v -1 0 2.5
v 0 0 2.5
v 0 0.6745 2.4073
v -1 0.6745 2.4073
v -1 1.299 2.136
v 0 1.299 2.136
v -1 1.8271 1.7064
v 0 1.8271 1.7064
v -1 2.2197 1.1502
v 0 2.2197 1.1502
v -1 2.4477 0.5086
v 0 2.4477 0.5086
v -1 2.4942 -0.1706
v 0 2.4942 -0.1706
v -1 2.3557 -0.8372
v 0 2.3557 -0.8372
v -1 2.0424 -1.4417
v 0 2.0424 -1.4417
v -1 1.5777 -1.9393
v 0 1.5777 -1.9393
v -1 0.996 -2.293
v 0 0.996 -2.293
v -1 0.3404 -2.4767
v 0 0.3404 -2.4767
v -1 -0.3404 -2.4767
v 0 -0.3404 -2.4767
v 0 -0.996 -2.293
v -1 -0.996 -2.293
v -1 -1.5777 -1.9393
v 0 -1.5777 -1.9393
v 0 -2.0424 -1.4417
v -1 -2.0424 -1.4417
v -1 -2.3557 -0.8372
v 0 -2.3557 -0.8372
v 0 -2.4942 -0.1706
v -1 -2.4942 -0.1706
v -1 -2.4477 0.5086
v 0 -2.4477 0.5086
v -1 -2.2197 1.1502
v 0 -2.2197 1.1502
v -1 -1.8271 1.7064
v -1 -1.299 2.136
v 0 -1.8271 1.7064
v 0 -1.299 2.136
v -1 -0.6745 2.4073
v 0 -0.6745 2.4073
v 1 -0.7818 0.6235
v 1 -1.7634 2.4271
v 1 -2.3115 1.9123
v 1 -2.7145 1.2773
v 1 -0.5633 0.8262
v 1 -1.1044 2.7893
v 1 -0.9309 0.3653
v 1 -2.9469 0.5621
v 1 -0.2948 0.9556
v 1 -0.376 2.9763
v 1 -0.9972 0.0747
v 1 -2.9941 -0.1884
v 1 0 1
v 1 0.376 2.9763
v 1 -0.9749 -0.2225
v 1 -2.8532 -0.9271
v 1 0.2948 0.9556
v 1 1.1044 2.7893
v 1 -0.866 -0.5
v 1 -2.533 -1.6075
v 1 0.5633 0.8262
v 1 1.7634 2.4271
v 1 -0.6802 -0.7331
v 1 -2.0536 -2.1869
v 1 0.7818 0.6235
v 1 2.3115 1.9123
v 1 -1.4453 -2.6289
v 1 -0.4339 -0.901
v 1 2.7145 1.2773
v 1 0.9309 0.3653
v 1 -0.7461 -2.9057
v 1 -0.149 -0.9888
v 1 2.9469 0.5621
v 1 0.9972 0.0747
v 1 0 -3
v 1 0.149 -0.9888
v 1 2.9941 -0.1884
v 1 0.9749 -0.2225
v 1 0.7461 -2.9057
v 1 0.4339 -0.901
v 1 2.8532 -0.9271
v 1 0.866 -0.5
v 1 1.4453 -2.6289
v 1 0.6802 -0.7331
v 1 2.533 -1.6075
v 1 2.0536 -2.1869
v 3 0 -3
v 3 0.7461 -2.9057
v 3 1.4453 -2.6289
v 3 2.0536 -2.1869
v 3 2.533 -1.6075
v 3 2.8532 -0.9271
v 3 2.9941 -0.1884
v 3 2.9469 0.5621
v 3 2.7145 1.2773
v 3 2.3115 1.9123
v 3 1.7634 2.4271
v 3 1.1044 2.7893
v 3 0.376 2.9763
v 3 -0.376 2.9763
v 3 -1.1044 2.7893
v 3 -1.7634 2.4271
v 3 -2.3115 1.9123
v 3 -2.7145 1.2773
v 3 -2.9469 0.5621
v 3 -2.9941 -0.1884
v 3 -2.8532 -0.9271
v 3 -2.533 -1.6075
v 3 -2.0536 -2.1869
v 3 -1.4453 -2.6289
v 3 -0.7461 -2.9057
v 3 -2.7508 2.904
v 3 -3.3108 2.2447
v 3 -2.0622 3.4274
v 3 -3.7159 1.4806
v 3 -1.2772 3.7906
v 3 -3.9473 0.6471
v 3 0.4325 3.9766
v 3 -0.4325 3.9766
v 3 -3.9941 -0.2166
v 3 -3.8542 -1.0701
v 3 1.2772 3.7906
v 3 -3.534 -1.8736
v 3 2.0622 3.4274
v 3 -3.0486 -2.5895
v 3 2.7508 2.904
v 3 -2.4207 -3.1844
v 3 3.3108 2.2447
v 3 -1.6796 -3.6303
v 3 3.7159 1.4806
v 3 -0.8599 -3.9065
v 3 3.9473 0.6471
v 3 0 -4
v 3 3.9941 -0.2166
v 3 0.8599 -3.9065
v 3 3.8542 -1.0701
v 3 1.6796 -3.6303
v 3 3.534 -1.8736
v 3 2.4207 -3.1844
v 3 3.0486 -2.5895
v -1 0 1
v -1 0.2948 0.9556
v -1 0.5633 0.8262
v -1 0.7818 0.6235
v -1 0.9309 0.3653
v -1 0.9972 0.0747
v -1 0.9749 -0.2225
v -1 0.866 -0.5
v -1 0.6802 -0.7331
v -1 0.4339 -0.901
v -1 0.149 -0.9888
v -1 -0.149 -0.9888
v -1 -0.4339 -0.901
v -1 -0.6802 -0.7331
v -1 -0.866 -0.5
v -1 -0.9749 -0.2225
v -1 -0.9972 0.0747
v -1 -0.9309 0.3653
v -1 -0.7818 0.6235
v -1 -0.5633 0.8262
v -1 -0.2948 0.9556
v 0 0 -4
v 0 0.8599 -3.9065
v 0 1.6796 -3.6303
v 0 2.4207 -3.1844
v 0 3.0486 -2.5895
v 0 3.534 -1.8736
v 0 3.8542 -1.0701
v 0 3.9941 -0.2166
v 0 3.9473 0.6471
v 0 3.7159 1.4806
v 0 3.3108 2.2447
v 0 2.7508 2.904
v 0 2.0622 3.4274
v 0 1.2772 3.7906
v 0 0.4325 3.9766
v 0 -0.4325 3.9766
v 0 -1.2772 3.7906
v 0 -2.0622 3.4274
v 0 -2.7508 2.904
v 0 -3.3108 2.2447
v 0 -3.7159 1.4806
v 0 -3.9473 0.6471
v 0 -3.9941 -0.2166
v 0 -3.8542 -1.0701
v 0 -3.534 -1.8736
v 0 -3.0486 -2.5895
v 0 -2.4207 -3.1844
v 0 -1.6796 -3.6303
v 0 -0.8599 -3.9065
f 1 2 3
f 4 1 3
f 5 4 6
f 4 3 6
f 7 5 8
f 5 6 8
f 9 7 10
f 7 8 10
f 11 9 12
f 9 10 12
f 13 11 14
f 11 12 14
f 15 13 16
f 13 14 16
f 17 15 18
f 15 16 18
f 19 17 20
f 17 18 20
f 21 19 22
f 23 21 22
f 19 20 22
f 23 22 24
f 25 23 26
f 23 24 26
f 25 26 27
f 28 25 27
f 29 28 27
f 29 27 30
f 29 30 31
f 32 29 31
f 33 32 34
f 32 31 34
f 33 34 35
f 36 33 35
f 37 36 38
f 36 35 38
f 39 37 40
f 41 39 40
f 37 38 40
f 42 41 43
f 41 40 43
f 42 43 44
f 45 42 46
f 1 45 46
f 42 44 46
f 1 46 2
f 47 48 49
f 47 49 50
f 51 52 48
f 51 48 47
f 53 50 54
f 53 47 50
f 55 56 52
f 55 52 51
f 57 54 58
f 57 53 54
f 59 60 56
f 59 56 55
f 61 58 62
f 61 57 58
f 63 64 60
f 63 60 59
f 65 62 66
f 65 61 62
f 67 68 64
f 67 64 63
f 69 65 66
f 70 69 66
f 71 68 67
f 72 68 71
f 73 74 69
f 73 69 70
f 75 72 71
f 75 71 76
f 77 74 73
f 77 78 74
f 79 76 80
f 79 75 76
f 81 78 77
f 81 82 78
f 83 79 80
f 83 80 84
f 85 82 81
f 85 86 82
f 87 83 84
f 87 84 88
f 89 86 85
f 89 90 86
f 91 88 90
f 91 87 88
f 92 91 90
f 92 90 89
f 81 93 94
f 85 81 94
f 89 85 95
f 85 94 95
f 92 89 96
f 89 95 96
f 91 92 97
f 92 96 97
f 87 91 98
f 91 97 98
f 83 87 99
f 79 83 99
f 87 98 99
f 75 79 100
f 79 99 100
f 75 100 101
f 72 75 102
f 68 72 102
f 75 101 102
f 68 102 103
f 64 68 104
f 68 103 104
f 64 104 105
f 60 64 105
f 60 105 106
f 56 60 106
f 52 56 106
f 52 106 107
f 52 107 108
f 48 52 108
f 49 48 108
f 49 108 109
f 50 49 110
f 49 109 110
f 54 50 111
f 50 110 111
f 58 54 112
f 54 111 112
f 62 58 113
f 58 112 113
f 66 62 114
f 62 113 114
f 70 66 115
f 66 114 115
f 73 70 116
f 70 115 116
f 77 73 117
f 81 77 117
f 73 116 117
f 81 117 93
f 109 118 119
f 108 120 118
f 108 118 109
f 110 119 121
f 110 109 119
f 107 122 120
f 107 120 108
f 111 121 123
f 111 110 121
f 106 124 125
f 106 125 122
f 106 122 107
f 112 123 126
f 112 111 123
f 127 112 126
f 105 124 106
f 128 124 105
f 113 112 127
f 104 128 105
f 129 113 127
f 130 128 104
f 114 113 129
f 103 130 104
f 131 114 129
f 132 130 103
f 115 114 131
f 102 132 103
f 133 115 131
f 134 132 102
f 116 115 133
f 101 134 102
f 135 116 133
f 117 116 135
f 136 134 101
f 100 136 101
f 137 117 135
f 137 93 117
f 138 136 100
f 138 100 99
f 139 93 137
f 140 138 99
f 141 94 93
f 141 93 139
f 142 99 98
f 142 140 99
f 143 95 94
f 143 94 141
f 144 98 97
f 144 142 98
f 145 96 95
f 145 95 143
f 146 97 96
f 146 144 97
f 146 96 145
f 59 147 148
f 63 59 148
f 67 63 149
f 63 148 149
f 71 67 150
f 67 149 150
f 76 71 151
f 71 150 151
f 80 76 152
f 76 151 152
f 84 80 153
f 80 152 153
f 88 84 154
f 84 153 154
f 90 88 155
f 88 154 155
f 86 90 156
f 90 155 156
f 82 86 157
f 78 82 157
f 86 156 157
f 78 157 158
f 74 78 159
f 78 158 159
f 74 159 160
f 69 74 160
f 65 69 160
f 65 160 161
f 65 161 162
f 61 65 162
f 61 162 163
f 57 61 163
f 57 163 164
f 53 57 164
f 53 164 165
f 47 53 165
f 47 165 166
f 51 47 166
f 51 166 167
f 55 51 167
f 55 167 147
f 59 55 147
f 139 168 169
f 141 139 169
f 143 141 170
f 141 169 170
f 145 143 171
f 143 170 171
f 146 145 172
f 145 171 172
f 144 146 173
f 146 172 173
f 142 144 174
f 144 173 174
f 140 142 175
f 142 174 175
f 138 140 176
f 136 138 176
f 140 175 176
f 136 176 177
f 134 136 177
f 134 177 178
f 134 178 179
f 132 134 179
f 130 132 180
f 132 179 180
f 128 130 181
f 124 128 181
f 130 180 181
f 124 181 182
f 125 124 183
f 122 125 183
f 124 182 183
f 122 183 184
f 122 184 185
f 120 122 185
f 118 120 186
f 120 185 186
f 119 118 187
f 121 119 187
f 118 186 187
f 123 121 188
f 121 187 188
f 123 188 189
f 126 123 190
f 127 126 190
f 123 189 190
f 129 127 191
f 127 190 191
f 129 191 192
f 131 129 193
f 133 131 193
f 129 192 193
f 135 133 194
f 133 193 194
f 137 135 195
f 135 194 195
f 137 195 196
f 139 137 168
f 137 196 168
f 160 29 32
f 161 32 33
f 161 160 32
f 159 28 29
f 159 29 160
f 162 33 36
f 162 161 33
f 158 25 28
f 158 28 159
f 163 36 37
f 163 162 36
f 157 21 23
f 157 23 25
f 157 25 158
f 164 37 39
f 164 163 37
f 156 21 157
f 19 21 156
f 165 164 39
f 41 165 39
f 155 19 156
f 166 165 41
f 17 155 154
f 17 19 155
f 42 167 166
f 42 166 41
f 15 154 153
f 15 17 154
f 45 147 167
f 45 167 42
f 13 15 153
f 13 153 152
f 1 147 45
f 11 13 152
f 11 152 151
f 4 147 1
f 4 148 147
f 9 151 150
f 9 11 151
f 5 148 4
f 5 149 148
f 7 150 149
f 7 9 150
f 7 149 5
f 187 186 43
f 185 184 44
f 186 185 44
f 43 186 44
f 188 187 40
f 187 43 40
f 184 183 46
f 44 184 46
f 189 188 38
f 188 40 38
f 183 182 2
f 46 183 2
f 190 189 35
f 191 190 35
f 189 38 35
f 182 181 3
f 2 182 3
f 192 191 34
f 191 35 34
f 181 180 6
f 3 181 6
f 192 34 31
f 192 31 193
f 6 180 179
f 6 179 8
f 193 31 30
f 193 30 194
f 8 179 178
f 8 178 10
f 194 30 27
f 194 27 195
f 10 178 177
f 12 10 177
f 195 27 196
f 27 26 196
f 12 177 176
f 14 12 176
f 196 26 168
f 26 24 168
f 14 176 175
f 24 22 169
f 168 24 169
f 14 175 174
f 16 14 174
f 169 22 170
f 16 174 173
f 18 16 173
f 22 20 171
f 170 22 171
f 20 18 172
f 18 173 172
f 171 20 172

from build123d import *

# Parameters (mm, degrees)
ESBO_O1_R                = 4
RESSALTO_EXTRUS_O1_DEPTH = 3
ESBO_O2_R                = 3
CORTE_EXTRUS_O1_DEPTH    = 2
ESBO_O3_R                = 2.5
RESSALTO_EXTRUS_O2_DEPTH = 1
ESBO_O4_R                = 1
CORTE_EXTRUS_O2_DEPTH    = 7.92820323


with BuildPart() as part:
    # Esboço1 → Ressalto-extrusão1 (new body)
    with BuildSketch(Plane(origin=(0, 0, 0), x_dir=(0, 0, -1), z_dir=(1, 0, 0))):
        Circle(ESBO_O1_R)
    extrude(amount=RESSALTO_EXTRUS_O1_DEPTH)

    # Esboço2 → Corte-extrusão1 (cut)
    with BuildSketch(Plane(origin=(3, 0, 0), x_dir=(0, 0, -1), z_dir=(1, 0, 0))):
        Circle(ESBO_O2_R)
    extrude(amount=-CORTE_EXTRUS_O1_DEPTH, mode=Mode.SUBTRACT)

    # Esboço3 → Ressalto-extrusão2 (add)
    with BuildSketch(Plane.ZY):
        Circle(ESBO_O3_R)
    extrude(amount=RESSALTO_EXTRUS_O2_DEPTH)

    # Esboço4 → Corte-extrusão2 (cut, through all)
    with BuildSketch(Plane.ZY.offset(1)):
        Circle(ESBO_O4_R)
    extrude(amount=-CORTE_EXTRUS_O2_DEPTH, mode=Mode.SUBTRACT)


solid = part.part
